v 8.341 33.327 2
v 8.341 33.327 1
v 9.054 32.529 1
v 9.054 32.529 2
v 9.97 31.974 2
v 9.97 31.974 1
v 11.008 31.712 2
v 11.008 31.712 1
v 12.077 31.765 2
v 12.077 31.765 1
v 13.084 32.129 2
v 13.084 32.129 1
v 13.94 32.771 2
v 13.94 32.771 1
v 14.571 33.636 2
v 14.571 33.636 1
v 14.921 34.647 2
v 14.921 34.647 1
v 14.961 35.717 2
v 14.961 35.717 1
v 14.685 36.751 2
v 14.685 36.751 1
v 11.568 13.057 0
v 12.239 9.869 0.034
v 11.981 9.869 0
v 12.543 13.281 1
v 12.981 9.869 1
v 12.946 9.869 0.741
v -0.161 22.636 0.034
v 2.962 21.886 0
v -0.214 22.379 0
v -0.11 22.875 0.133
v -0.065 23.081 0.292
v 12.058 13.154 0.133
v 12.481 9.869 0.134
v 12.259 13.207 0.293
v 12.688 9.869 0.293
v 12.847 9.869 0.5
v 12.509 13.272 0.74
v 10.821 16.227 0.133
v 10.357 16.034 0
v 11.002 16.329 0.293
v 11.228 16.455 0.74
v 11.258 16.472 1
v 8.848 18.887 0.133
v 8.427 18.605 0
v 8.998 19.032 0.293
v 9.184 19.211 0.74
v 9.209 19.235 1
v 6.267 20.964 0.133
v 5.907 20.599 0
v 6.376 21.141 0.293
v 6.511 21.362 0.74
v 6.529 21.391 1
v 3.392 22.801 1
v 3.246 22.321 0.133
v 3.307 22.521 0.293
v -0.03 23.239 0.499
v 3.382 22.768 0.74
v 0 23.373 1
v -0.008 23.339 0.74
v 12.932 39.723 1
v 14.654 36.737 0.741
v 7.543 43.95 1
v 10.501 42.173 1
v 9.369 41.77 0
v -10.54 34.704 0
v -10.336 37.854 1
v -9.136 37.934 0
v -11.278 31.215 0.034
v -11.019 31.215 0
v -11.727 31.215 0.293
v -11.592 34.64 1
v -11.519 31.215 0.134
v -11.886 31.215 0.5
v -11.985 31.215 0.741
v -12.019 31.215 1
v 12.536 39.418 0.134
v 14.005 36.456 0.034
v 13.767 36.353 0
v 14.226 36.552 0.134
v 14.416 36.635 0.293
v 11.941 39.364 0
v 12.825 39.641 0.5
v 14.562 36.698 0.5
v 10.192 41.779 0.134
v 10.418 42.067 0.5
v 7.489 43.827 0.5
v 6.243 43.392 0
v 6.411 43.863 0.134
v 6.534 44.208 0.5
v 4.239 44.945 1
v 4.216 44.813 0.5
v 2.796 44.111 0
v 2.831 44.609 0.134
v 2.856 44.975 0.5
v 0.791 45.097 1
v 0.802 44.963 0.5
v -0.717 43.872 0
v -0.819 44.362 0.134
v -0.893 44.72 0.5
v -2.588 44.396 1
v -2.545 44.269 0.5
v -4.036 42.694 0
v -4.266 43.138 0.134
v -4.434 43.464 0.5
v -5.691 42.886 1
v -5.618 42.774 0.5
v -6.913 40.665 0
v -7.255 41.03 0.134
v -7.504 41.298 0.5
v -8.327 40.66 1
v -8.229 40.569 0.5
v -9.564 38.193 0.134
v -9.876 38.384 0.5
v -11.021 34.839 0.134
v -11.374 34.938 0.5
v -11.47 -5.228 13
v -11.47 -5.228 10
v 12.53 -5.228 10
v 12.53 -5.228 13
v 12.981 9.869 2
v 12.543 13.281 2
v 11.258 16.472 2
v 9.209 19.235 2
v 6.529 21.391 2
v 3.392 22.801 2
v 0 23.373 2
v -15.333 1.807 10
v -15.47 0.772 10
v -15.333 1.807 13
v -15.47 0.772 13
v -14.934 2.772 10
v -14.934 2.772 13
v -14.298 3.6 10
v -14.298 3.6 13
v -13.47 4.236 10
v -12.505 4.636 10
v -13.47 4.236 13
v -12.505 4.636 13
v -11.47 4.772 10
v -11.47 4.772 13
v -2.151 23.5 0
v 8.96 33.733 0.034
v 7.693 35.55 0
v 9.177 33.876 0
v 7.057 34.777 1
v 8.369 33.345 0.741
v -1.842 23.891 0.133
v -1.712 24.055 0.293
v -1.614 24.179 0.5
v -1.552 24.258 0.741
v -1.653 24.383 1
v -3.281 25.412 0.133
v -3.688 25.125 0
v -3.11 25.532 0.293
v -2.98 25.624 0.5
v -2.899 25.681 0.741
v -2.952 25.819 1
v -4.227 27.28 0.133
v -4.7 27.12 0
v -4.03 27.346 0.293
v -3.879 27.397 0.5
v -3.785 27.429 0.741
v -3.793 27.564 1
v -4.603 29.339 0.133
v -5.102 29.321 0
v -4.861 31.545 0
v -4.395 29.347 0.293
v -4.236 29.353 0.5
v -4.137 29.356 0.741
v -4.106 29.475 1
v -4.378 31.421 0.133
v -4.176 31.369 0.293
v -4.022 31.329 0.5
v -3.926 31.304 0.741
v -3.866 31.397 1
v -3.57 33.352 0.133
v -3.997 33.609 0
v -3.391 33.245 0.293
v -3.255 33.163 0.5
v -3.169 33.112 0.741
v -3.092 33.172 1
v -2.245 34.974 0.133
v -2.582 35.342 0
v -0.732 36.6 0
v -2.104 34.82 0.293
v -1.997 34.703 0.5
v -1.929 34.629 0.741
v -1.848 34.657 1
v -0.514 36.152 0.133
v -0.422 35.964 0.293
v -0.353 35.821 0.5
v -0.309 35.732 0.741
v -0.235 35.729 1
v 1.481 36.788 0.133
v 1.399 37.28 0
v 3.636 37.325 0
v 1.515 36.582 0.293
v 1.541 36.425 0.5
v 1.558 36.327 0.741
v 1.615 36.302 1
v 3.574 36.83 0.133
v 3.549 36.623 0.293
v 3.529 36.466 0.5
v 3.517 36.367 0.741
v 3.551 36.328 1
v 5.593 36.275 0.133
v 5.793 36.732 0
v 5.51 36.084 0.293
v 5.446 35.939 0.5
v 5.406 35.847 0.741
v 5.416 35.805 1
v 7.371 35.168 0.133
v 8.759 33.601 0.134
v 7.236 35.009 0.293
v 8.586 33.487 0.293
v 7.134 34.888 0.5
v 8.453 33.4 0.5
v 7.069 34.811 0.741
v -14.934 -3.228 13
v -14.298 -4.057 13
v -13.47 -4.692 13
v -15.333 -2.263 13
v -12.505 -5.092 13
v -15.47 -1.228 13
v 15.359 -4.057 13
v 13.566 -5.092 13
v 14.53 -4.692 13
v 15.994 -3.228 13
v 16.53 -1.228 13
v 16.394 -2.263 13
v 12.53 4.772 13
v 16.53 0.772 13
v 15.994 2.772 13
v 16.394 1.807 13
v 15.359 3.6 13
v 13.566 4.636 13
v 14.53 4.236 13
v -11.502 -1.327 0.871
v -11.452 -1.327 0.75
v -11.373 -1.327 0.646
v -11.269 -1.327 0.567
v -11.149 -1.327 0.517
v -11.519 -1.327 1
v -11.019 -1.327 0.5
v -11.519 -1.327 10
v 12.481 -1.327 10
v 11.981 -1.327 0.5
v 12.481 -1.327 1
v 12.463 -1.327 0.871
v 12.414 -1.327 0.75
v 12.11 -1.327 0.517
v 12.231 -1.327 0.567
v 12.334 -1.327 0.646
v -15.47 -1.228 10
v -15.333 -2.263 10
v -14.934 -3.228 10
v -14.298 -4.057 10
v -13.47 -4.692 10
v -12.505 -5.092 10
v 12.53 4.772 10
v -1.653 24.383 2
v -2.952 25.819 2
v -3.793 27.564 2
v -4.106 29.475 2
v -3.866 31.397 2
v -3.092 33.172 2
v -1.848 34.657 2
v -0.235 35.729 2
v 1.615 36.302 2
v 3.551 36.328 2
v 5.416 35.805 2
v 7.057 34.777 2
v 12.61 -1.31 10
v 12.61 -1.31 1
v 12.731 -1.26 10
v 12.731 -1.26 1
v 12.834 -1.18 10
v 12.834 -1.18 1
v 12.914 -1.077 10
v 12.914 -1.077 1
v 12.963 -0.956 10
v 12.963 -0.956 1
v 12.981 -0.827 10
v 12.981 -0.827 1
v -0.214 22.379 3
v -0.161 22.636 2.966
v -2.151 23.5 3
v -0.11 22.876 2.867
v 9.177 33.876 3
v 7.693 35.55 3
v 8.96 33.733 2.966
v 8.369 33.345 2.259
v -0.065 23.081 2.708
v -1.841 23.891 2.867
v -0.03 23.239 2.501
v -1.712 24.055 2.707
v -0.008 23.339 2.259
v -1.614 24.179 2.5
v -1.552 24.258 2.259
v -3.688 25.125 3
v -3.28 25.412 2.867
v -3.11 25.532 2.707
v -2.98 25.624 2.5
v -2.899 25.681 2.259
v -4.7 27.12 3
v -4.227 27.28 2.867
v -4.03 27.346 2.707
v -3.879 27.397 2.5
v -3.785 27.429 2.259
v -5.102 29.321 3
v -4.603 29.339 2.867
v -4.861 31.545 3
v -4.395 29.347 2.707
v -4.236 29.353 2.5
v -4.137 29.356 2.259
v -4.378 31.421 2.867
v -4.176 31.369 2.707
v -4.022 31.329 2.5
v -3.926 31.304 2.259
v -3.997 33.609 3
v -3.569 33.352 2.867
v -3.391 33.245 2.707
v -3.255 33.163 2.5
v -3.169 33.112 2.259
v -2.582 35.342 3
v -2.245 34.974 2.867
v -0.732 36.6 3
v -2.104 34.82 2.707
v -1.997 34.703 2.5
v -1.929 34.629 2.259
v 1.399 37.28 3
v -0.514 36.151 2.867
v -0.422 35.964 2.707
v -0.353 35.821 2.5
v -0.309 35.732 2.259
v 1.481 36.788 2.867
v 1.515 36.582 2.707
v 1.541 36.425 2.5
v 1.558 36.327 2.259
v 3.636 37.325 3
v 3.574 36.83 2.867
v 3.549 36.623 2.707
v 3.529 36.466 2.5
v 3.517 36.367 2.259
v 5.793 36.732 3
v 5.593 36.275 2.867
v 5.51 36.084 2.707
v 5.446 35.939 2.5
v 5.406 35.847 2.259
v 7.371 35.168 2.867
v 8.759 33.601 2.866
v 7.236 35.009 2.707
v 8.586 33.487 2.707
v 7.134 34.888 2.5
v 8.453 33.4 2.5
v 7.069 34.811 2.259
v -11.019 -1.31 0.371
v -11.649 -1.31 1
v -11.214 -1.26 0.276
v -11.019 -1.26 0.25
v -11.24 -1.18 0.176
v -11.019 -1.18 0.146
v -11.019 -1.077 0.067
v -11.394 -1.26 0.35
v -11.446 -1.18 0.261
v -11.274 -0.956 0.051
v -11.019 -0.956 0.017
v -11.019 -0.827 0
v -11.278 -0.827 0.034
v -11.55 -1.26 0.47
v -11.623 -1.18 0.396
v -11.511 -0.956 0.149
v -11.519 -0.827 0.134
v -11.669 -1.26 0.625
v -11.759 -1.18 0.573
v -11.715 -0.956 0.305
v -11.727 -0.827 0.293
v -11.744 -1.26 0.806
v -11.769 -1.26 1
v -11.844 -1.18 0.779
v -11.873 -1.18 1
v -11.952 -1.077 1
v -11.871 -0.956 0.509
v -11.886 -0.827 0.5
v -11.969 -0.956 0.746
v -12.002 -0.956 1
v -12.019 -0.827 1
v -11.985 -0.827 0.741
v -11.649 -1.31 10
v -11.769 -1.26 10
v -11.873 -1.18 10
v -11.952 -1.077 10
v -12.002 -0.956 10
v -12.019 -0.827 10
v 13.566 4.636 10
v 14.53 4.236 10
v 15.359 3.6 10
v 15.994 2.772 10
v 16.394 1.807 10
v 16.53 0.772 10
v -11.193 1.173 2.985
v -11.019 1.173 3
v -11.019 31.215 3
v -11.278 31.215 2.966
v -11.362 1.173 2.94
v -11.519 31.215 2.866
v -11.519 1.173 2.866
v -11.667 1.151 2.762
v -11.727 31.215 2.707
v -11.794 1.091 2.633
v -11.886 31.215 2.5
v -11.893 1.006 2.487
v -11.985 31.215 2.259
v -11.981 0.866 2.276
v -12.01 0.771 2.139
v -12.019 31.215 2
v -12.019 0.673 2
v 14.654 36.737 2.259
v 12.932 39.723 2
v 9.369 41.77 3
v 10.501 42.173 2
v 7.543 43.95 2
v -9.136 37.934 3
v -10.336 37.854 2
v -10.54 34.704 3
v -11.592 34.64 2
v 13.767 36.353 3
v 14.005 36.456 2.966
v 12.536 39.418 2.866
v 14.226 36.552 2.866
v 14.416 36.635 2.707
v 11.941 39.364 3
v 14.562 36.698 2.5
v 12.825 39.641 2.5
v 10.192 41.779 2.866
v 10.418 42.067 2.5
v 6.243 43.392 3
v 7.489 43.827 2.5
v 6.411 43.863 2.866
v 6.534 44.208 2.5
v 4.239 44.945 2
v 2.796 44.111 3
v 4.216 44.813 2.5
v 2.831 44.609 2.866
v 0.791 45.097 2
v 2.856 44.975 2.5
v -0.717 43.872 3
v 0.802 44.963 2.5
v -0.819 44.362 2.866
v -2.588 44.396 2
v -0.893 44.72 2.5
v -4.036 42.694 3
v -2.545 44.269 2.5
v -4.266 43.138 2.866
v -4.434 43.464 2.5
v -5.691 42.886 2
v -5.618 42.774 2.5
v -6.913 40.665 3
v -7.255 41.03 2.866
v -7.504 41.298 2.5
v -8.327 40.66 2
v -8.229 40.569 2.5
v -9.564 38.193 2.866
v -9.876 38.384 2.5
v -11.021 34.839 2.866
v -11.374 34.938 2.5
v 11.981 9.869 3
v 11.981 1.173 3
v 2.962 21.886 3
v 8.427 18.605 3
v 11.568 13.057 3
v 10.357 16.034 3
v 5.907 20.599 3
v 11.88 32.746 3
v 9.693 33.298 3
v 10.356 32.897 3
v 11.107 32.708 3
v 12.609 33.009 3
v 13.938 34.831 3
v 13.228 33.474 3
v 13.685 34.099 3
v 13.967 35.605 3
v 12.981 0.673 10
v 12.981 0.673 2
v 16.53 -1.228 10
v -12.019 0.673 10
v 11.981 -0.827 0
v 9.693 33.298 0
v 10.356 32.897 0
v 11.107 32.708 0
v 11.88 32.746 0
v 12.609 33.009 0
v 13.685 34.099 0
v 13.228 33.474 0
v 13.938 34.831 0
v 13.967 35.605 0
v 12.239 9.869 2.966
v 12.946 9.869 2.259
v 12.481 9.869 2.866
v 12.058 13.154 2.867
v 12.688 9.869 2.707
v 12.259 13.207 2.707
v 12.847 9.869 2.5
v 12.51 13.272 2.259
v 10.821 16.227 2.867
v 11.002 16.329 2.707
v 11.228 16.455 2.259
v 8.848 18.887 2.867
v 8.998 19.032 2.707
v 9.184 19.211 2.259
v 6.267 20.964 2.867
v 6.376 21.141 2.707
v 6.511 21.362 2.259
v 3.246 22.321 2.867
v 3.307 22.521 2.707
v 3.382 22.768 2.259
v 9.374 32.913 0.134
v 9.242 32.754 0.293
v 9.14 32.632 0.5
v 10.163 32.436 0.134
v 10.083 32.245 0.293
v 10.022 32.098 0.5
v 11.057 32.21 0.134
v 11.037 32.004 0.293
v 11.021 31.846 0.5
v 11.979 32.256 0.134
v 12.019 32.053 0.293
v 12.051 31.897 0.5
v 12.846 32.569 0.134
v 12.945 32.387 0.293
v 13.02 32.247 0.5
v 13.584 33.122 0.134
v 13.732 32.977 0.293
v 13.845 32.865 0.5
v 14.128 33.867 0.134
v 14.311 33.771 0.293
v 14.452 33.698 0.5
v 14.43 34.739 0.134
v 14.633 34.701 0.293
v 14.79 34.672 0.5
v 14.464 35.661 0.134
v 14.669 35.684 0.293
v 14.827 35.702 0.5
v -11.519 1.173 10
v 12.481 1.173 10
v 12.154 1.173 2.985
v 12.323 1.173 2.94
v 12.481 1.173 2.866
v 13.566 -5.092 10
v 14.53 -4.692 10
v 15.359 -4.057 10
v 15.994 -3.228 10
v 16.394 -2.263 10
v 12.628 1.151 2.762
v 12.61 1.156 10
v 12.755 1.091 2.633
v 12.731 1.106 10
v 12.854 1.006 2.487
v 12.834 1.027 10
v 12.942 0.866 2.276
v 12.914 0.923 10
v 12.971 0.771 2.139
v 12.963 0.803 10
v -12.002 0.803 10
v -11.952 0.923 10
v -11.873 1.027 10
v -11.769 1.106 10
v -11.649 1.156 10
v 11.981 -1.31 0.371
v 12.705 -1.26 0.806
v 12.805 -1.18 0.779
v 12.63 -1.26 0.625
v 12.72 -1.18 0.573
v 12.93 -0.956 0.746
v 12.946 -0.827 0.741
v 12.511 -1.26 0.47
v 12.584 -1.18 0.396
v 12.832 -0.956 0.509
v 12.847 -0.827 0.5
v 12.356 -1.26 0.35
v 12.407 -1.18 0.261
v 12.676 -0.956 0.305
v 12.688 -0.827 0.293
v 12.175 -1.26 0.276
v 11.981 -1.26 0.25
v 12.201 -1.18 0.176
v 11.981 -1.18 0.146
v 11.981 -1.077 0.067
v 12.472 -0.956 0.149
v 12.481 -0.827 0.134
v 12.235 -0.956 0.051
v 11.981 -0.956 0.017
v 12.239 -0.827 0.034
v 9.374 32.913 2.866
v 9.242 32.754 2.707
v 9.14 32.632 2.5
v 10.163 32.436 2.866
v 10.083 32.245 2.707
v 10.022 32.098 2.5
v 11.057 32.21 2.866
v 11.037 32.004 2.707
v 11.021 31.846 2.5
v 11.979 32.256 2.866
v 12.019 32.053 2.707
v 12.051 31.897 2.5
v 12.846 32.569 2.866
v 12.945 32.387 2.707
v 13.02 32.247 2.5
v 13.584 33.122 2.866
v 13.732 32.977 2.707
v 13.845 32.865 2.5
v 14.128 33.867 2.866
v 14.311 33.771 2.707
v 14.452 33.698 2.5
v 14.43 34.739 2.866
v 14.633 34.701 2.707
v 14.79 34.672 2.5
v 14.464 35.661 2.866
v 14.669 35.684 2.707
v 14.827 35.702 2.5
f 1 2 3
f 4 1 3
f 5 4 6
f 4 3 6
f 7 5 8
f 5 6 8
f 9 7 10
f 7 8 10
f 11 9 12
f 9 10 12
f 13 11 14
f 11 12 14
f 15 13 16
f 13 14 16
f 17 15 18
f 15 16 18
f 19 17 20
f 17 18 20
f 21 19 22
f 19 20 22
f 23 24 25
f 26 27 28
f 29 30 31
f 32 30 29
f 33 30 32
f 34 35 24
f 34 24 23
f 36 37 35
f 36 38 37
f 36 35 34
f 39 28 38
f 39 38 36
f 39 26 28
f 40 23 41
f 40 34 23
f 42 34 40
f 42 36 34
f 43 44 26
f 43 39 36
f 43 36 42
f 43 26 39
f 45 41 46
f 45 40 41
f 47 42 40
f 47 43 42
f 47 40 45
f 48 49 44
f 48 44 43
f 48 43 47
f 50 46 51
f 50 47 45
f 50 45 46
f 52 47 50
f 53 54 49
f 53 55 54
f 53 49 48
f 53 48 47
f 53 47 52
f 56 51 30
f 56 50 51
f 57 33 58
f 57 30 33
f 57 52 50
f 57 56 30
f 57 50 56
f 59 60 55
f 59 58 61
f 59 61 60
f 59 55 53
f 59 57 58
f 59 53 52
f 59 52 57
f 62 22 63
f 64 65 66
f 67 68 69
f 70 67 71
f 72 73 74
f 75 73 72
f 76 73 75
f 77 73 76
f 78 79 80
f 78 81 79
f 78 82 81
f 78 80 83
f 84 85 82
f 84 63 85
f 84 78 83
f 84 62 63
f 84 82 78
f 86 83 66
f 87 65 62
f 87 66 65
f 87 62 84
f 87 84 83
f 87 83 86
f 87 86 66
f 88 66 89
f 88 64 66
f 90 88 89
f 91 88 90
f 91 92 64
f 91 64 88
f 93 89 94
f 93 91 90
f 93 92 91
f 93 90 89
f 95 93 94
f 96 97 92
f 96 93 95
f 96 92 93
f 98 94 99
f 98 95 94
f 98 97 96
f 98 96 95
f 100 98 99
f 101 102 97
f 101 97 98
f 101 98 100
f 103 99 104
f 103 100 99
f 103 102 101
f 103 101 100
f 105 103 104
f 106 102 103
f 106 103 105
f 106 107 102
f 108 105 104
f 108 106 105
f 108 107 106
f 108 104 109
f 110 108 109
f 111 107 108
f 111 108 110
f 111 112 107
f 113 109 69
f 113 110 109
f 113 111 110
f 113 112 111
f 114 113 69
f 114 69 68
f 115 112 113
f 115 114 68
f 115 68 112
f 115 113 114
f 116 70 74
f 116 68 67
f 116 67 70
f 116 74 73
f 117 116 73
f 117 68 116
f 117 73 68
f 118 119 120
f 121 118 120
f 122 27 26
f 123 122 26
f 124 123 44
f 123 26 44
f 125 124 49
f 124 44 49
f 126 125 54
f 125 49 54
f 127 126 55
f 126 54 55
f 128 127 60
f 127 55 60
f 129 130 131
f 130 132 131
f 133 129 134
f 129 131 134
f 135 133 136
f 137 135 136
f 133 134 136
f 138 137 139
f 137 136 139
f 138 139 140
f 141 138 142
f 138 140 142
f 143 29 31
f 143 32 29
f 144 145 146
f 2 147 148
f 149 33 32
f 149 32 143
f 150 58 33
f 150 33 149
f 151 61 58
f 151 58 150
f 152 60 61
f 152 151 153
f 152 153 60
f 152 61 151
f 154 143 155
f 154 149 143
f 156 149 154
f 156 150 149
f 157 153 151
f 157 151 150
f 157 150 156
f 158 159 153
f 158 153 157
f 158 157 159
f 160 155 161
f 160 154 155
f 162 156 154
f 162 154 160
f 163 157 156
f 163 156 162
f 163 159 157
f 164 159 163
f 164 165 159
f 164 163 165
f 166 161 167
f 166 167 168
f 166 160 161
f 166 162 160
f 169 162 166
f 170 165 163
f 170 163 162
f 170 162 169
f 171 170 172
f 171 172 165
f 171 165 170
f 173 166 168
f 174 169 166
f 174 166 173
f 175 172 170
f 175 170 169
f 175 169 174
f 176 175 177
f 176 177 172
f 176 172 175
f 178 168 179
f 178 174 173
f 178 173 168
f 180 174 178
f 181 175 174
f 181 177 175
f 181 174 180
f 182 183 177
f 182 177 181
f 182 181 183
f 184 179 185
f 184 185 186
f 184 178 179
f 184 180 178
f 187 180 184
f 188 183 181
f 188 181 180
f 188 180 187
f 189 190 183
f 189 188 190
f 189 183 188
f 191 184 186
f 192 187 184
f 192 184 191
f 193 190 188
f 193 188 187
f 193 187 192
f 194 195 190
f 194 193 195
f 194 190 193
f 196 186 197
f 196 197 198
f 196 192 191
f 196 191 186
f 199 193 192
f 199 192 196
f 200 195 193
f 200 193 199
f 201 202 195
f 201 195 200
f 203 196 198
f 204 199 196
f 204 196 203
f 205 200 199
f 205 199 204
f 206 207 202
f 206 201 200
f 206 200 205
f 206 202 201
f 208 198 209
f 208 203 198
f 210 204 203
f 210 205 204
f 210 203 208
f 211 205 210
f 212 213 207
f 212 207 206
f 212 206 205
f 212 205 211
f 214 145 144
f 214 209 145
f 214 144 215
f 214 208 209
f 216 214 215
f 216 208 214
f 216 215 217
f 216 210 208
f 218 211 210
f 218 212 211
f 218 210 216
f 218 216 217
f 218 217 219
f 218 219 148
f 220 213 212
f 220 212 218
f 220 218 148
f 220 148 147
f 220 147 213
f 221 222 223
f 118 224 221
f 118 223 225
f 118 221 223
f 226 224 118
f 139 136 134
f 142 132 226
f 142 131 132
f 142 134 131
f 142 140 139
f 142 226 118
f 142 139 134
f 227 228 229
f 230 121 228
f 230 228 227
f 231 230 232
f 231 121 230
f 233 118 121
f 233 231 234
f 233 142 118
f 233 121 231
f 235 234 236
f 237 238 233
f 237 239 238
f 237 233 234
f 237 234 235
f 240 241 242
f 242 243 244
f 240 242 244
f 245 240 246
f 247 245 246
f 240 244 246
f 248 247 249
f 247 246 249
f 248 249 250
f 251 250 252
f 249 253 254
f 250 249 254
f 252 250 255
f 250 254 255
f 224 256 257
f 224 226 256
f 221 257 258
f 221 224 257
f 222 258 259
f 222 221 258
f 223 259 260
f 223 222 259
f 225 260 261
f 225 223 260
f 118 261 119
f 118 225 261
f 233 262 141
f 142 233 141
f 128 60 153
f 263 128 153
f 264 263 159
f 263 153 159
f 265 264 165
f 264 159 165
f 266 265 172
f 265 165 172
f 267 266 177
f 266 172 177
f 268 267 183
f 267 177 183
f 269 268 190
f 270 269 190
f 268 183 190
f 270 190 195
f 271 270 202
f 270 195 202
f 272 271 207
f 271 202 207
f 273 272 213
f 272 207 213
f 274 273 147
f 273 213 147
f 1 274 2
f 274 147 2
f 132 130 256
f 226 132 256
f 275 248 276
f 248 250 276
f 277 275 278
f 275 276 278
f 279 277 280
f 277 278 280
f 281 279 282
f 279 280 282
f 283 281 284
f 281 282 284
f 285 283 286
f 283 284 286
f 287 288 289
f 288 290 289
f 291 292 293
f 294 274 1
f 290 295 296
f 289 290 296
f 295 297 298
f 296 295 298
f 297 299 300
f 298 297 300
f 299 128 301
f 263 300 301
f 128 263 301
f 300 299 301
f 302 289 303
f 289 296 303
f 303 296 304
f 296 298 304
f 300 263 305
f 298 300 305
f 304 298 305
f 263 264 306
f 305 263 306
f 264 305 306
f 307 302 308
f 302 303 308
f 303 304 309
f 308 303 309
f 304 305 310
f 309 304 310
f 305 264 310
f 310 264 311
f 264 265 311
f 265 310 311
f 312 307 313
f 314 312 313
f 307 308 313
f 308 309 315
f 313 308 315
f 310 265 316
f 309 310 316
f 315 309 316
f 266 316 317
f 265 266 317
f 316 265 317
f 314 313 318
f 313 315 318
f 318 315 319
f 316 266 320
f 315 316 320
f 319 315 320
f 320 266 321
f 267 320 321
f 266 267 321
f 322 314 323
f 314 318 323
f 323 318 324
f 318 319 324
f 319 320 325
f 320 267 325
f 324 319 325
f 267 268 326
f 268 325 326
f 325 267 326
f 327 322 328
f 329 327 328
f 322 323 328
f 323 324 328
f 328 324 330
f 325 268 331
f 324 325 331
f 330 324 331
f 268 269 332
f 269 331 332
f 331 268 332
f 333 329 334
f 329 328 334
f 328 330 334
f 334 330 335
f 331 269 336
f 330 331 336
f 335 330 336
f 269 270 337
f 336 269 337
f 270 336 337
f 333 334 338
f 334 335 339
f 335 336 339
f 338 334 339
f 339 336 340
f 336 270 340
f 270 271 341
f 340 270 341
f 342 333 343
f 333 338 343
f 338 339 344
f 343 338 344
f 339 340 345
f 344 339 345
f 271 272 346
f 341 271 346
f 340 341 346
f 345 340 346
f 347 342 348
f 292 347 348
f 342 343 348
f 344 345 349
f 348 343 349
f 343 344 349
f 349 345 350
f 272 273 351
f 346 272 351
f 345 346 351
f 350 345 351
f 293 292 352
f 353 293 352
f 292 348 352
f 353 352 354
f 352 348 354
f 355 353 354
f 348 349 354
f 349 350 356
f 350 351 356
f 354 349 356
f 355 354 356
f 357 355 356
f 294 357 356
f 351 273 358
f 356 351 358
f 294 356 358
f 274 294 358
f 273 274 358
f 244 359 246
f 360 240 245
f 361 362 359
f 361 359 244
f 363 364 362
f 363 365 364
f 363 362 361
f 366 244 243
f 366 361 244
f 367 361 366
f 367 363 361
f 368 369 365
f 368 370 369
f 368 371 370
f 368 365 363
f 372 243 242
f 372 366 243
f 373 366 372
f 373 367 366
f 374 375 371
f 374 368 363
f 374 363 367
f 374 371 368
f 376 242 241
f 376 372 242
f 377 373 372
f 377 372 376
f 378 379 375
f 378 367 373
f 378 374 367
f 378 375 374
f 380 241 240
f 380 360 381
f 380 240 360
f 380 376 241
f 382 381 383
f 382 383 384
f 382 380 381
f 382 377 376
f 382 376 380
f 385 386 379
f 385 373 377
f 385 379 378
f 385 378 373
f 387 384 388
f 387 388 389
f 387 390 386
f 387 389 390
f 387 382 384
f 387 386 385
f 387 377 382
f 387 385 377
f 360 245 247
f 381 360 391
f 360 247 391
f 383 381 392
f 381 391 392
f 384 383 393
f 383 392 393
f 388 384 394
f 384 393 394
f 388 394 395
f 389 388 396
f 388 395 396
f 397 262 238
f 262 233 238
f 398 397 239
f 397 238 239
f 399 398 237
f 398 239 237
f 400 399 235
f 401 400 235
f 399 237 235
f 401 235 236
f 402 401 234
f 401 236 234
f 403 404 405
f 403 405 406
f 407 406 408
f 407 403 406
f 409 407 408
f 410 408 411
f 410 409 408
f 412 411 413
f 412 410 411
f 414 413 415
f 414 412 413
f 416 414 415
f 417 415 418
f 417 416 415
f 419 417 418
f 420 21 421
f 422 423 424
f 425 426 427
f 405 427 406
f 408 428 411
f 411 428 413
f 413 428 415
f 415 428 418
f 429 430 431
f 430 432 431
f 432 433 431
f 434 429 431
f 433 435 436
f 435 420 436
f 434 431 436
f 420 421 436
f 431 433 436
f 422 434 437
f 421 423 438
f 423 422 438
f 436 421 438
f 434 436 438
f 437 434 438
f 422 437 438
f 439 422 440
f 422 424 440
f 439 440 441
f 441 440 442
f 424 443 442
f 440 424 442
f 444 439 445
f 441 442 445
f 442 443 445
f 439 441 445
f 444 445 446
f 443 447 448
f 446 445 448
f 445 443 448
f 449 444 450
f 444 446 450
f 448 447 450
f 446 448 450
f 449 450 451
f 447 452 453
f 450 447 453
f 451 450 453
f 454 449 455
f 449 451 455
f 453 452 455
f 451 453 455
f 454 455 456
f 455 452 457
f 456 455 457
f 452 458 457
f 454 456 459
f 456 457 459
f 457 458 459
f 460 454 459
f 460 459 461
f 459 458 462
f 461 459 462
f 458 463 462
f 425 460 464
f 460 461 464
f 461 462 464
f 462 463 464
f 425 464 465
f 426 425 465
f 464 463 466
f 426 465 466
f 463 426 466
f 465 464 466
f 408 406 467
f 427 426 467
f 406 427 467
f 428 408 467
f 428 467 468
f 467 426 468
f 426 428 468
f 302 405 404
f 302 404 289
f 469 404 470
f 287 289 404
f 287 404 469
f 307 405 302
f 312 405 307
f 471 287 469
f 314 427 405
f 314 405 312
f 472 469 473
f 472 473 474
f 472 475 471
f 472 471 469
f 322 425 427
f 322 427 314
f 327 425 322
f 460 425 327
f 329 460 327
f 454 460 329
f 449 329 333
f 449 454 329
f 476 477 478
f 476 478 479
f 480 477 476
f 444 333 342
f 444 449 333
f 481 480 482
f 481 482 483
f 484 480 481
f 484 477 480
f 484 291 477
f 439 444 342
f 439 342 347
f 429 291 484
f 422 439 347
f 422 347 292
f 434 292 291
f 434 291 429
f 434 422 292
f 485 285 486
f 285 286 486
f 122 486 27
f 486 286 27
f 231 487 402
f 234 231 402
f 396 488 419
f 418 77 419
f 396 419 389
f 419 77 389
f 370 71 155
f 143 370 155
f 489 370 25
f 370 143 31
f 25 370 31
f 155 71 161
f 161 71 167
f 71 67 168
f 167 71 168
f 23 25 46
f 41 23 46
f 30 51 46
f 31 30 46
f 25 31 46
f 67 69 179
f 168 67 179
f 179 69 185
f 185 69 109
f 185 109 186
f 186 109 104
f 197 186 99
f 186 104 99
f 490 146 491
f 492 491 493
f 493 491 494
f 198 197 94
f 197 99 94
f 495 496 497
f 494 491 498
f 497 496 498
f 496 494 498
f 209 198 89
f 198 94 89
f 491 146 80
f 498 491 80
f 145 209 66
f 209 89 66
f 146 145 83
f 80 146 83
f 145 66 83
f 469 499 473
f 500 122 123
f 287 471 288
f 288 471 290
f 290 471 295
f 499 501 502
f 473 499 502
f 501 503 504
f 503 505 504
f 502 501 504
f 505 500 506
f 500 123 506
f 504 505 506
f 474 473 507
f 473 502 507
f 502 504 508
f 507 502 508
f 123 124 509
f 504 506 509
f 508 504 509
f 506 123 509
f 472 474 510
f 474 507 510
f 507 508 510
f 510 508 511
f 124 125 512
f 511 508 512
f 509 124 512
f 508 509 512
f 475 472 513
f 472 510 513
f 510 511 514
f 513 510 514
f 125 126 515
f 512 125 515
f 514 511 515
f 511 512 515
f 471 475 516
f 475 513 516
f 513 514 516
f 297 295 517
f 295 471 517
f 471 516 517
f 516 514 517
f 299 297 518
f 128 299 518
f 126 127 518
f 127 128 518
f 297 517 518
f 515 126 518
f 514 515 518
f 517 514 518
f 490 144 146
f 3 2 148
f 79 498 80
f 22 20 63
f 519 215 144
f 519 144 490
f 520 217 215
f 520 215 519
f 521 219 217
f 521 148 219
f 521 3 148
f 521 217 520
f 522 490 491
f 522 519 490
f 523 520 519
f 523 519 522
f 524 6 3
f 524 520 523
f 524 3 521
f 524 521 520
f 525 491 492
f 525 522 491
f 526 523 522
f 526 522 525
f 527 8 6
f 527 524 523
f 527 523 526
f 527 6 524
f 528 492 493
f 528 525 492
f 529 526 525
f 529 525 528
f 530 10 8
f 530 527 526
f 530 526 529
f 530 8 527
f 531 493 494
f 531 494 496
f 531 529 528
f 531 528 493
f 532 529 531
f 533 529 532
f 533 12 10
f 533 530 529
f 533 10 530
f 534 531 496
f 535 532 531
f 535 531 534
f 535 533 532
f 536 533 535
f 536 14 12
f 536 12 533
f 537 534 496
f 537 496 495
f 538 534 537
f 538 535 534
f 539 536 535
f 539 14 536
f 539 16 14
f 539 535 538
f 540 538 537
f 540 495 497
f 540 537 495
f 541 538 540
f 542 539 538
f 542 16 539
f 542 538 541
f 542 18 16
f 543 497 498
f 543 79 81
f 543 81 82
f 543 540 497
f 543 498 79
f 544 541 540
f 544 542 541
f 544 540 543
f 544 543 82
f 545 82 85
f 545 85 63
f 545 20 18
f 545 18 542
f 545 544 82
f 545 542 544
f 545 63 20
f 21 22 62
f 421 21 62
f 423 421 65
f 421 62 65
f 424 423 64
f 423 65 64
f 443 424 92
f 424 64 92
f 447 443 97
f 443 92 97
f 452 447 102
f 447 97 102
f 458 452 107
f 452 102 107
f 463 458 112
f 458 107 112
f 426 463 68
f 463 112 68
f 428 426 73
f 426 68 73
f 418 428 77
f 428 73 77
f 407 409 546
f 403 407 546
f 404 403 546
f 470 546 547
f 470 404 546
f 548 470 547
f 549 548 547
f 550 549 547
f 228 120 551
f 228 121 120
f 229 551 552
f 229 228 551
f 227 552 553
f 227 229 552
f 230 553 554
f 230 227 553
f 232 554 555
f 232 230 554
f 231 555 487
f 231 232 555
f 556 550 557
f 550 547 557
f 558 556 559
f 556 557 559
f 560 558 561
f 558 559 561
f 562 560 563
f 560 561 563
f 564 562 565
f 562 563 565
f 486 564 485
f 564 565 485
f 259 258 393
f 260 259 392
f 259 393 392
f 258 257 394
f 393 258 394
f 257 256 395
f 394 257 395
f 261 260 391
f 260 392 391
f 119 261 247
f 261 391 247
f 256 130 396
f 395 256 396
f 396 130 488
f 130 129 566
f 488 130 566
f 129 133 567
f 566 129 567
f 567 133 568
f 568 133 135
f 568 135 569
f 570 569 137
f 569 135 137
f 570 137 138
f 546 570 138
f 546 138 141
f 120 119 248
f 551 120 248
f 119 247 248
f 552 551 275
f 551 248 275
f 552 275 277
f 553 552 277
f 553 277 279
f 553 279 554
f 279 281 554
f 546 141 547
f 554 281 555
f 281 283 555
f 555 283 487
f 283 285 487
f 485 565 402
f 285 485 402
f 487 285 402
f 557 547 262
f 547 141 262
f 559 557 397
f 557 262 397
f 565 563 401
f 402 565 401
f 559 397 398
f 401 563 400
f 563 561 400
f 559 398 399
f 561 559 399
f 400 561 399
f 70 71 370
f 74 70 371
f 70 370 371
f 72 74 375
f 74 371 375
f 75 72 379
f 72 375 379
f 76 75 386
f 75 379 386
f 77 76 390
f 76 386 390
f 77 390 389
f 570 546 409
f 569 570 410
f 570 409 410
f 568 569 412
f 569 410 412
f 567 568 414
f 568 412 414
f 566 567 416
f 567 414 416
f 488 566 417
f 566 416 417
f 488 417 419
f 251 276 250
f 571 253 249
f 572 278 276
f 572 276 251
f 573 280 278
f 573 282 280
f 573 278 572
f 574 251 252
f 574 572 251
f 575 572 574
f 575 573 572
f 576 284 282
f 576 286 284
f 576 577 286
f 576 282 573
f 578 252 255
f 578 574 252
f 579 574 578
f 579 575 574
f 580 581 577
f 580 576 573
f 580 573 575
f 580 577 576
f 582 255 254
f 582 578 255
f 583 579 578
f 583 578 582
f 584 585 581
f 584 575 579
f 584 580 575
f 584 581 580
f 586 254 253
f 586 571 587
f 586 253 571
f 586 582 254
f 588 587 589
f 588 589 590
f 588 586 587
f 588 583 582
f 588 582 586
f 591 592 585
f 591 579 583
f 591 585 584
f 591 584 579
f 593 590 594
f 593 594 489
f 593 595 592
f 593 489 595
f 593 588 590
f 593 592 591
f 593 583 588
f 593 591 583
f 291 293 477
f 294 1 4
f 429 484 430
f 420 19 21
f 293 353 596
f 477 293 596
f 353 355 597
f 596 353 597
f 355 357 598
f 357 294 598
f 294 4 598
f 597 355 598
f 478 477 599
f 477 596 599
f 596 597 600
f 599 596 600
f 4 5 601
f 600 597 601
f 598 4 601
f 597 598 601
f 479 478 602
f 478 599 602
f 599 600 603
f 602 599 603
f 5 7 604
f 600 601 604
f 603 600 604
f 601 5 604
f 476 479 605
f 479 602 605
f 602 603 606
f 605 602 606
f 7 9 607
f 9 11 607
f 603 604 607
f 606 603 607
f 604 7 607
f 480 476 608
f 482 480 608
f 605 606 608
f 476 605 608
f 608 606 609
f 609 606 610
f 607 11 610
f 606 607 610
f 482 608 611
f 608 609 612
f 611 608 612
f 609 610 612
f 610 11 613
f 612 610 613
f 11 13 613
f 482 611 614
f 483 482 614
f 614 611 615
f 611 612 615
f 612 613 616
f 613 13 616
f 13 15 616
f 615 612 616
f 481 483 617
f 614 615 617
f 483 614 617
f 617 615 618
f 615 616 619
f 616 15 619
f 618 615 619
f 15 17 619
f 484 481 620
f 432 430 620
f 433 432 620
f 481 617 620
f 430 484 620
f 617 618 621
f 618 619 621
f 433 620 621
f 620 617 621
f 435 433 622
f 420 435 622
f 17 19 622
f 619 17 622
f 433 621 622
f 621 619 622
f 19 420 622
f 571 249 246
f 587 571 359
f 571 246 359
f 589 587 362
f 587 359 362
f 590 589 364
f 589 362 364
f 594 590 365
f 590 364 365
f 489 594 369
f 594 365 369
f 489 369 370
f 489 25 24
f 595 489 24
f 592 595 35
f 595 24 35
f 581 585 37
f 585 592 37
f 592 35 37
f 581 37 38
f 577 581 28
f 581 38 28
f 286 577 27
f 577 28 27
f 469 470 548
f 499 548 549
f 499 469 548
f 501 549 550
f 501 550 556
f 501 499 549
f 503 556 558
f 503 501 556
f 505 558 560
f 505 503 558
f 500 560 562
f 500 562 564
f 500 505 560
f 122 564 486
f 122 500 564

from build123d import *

# Parameters (mm, degrees)
F0_W     = 25
F0_H     = 3.598708484
F0_H_2   = 2.5
F1_DEPTH = 3
F2_DEPTH = 10
F3_START = 10
F3_DEPTH = 3
F4_R     = 4
F5_R     = 1
F6_R     = 0.5


with BuildPart() as f1:
    # F0 (on Top) → F1 (new body)
    with BuildSketch(Plane.XY):
        with BuildLine():
            Line((-12.0194856117, 31.2152840197), (-12.0194856117, 4.7718174662))
            Line((-12.0194856117, 4.7718174662), (12.9805143883, 4.7718174662))
            Line((12.9805143883, 4.7718174662), (12.9805143883, 9.8692406903))
            ThreePointArc((12.9805143883, 9.8692406903), (9.2091630199, 19.2346795626), (0, 23.3730189502))
            ThreePointArc((0, 23.3730189502), (-2.5235742208, 33.9593593839), (8.340984877, 33.3265985788))
            ThreePointArc((8.340984877, 33.3265985788), (13.0836829302, 32.1289610754), (14.685023576, 36.750998348))
            ThreePointArc((14.685023576, 36.750998348), (-0.9201685744, 44.8514028231), (-12.0194856117, 31.2152840197))
        make_face()
        with Locations((0.4805143883, 2.9724632242)):
            Rectangle(F0_W, F0_H)
        with Locations((0.4805143883, -0.0768910178)):
            Rectangle(F0_W, F0_H_2)
    extrude(amount=F1_DEPTH)

    # F0 (on Top) → F2 (join)
    with BuildSketch(Plane.XY):
        with Locations((0.4805143883, -0.0768910178)):
            Rectangle(F0_W, F0_H_2)
    extrude(amount=F2_DEPTH)

    # F0 (on Top) → F3 (join)
    with BuildSketch(Plane.XY.offset(F3_START)):
        with Locations((0.4805143883, 2.9724632242)):
            Rectangle(F0_W, F0_H)
        Polygon((-12.0194856117, -1.3268910178), (-12.0194856117, 1.1731089822), (-12.0194856117, 4.7718174662), (-15.4697376937, 4.7718174662), (-15.4697376937, -5.2281825338), (16.5302623063, -5.2281825338), (16.5302623063, 4.7718174662), (12.9805143883, 4.7718174662), (12.9805143883, 1.1731089822), (12.9805143883, -1.3268910178), align=None)
        with Locations((0.4805143883, -0.0768910178)):
            Rectangle(F0_W, F0_H_2)
    extrude(amount=F3_DEPTH)

    # F4
    f4_edges = [f1.edges().sort_by_distance(p)[0] for p in [
        (16.530262, -5.228183, 11.5),
        (16.530262, 4.771817, 11.5),
        (-15.469738, -5.228183, 11.5),
        (-15.469738, 4.771817, 11.5),
    ]]
    fillet(f4_edges, radius=F4_R)

    # F5
    f5_edges = [f1.edges().sort_by_distance(p)[0] for p in [
        (-2.523574, 33.959359, 3),
        (9.209163, 19.23468, 3),
        (12.980514, 5.521175, 3),
        (-0.920169, 44.851403, 0),
        (13.083683, 32.128961, 0),
        (-2.523574, 33.959359, 0),
        (9.209163, 19.23468, 0),
        (12.980514, 4.271175, 0),
        (-12.019486, 14.944197, 0),
    ]]
    fillet(f5_edges, radius=F5_R)

    # F6
    f6_edges = [f1.edges().sort_by_distance(p)[0] for p in [
        (12.980514, 1.173109, 6.5),
        (-12.019486, 1.173109, 6.5),
        (-12.019486, -1.326891, 5.5),
    ]]
    fillet(f6_edges, radius=F6_R)


solid = f1.part
